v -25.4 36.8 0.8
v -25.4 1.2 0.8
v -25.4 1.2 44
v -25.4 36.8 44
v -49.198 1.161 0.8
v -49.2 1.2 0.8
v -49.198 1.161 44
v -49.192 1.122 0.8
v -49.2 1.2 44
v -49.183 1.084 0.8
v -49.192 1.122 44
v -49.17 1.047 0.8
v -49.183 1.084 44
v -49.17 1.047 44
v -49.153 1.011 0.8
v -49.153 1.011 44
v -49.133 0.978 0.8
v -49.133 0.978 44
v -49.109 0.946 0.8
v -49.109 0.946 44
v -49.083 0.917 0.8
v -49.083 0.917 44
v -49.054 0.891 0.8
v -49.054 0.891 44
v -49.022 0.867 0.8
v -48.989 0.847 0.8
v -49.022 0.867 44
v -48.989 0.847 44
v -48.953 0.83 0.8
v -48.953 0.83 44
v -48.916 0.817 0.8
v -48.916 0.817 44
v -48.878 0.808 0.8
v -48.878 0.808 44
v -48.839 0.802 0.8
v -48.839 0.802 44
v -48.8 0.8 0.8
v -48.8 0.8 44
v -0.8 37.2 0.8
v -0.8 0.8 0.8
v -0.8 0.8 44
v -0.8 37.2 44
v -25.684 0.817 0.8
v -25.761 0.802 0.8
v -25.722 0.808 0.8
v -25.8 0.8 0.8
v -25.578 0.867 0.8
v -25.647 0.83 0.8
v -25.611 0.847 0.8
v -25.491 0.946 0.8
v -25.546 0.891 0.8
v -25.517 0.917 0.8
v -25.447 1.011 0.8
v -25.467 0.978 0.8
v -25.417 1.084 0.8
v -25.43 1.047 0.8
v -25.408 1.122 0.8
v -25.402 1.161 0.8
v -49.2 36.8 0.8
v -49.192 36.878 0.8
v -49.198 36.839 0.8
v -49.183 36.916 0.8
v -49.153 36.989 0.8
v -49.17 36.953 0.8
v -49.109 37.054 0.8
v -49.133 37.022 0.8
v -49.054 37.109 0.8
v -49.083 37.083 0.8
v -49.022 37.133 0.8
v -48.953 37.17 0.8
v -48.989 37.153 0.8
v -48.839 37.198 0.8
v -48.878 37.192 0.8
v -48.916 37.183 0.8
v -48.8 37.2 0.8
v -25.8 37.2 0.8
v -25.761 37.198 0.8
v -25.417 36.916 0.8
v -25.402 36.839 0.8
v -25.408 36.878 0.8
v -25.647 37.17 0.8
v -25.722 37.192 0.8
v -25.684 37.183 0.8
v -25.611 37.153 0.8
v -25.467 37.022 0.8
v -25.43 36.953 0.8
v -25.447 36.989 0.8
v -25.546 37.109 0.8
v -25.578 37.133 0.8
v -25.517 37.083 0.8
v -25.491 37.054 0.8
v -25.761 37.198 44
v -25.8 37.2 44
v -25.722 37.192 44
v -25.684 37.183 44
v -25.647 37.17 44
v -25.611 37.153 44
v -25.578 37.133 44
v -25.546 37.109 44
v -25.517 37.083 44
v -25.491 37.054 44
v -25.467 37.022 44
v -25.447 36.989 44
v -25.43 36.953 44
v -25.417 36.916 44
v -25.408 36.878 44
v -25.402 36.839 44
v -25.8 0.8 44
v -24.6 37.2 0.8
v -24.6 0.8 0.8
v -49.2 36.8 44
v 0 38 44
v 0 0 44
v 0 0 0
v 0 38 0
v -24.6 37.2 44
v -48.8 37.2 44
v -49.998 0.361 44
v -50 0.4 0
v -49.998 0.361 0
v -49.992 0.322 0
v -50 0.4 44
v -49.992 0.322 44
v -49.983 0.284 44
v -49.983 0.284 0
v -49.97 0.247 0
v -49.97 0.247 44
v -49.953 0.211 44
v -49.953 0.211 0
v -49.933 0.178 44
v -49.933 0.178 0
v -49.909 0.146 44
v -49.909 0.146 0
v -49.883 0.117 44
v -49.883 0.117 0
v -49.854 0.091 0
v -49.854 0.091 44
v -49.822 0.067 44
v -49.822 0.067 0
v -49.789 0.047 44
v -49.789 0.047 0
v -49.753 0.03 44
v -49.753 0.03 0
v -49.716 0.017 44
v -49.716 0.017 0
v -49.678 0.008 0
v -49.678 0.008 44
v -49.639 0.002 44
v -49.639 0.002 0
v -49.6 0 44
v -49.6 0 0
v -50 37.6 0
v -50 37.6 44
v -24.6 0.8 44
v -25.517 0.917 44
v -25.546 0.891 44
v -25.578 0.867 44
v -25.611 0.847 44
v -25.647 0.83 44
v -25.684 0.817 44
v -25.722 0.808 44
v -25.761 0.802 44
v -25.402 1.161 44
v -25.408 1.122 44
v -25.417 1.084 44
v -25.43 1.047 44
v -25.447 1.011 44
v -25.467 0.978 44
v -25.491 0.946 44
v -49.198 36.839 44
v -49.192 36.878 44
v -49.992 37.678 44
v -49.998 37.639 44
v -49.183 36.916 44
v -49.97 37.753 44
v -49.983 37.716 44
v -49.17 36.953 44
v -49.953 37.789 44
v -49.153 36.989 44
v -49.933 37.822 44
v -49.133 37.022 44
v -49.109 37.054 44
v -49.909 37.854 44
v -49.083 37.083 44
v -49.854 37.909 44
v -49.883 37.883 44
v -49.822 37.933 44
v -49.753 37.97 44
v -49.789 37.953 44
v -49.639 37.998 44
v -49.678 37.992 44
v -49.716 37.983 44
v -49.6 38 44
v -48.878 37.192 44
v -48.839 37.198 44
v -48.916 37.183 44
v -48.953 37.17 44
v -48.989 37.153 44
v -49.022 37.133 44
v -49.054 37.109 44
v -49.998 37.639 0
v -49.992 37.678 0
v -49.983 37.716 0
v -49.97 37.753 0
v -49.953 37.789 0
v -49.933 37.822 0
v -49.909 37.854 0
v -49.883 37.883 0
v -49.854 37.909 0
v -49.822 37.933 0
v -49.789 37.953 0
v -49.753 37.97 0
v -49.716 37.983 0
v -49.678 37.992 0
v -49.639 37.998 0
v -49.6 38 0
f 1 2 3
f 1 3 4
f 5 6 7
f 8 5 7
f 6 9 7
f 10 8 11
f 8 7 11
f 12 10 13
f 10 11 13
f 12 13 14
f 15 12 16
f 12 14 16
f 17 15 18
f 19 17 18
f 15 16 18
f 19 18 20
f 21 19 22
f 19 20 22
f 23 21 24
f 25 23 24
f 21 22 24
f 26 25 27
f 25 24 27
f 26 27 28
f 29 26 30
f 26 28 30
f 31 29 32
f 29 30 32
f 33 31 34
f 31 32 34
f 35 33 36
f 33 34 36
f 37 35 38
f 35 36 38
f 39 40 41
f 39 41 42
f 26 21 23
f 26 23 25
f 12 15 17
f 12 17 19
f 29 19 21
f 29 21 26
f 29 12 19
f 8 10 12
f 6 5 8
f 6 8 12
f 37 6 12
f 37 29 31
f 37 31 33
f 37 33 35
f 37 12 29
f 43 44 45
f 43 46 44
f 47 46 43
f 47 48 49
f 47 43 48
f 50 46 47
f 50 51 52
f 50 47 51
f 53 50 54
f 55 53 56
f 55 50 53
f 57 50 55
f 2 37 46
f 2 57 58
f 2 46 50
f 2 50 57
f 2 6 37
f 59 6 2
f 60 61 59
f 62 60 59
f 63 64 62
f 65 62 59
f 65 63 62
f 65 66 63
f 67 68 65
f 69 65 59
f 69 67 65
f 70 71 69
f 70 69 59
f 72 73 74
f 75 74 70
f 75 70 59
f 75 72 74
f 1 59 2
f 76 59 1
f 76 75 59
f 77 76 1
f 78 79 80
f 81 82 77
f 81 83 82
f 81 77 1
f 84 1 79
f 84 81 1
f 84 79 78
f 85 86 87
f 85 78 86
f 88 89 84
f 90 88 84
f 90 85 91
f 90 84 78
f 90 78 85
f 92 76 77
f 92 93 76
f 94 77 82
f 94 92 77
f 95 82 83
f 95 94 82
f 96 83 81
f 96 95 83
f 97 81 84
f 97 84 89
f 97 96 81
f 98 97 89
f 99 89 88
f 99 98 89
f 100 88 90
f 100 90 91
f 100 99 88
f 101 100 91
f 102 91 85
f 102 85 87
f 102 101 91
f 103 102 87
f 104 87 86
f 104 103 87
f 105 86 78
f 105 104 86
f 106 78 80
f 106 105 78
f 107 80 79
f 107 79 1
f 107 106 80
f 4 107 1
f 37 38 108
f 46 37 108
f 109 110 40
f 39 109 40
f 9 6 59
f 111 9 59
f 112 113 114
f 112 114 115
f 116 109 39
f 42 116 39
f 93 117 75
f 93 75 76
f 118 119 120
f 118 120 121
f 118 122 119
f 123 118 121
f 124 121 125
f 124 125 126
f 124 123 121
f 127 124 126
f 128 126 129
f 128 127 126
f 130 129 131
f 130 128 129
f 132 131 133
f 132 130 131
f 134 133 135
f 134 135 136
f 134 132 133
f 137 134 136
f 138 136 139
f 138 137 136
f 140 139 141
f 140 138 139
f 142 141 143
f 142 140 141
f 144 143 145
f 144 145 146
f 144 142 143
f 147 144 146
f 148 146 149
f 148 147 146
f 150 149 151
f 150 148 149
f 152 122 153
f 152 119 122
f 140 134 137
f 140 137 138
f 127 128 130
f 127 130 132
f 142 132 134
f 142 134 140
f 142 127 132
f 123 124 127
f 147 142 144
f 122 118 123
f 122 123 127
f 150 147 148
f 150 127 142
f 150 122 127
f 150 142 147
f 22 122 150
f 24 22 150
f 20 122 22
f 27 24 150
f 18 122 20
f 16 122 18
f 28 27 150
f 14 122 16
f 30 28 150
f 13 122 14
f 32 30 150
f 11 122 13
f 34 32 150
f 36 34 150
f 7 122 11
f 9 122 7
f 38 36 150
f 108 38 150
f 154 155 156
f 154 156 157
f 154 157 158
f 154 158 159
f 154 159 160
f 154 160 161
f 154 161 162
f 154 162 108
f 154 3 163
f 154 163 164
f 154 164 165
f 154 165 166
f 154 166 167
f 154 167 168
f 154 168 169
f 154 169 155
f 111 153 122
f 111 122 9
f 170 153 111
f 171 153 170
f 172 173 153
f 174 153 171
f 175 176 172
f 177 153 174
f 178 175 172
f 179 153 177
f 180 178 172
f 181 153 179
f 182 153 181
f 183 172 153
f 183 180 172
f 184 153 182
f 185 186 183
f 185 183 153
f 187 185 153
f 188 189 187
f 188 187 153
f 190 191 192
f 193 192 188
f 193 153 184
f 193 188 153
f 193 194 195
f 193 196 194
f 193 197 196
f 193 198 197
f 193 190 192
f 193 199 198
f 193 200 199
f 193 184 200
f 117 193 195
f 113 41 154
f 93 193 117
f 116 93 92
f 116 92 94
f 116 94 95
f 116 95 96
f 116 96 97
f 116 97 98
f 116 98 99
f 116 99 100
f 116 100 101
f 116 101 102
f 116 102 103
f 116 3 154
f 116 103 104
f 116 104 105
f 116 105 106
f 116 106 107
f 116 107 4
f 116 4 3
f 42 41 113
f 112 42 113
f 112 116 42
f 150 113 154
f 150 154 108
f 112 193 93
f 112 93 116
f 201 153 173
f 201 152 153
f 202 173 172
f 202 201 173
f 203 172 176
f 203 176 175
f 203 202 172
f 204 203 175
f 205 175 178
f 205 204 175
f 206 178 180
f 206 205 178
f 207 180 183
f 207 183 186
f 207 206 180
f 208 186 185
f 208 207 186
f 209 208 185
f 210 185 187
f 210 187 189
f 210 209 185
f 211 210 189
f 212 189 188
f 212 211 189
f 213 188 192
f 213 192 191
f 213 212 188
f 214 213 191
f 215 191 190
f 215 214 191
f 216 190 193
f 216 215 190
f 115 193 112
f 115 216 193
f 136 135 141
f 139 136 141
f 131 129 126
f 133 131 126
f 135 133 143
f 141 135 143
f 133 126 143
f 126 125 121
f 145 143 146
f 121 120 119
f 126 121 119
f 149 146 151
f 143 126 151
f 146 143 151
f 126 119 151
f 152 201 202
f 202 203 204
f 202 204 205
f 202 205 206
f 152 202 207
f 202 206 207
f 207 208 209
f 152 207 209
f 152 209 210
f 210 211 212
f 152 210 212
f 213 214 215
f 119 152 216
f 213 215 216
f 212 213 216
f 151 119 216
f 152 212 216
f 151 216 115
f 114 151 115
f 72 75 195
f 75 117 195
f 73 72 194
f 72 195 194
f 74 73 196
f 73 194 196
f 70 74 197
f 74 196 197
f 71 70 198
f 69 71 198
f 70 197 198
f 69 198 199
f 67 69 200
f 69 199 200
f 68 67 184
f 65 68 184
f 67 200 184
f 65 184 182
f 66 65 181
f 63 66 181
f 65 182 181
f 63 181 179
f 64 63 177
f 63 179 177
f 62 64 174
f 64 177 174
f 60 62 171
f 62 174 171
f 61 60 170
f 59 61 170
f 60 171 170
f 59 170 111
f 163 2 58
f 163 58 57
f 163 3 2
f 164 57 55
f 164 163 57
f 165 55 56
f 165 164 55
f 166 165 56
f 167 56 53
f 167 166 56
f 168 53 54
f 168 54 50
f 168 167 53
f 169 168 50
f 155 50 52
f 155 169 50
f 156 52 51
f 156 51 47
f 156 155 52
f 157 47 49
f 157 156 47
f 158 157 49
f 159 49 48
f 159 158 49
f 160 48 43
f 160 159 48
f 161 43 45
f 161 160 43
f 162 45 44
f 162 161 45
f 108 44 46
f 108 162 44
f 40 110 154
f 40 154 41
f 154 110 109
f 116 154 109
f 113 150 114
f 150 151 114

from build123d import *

# Parameters (mm, degrees)
F0_W     = 50
F0_H     = 38
F1_DEPTH = 0.8
F2_W     = 50
F2_H     = 38
F2_W_2   = 23.8
F2_H_2   = 36.4
F3_DEPTH = 43.2
F4_R     = 0.4


with BuildPart() as f1:
    # F0 (on Top) → F1 (new body)
    with BuildSketch(Plane.XY):
        with Locations((-25, 19)):
            Rectangle(F0_W, F0_H)
    extrude(amount=F1_DEPTH)

    # F2 (on face) → F3 (join)
    with BuildSketch(Plane.XY.offset(0.8)):
        with Locations((-25, 19)):
            Rectangle(F2_W, F2_H)
        with Locations((-37.3, 19)):
            Rectangle(F2_W_2, F2_H_2, mode=Mode.SUBTRACT)
        with Locations((-12.7, 19)):
            Rectangle(F2_W_2, F2_H_2, mode=Mode.SUBTRACT)
    extrude(amount=F3_DEPTH)

    # F4
    f4_edges = [f1.edges().sort_by_distance(p)[0] for p in [
        (-50, 0, 22),
        (-49.2, 0.8, 22.4),
        (-49.2, 37.2, 22.4),
        (-50, 38, 22),
        (-25.4, 37.2, 22.4),
        (-25.4, 0.8, 22.4),
    ]]
    fillet(f4_edges, radius=F4_R)


solid = f1.part
